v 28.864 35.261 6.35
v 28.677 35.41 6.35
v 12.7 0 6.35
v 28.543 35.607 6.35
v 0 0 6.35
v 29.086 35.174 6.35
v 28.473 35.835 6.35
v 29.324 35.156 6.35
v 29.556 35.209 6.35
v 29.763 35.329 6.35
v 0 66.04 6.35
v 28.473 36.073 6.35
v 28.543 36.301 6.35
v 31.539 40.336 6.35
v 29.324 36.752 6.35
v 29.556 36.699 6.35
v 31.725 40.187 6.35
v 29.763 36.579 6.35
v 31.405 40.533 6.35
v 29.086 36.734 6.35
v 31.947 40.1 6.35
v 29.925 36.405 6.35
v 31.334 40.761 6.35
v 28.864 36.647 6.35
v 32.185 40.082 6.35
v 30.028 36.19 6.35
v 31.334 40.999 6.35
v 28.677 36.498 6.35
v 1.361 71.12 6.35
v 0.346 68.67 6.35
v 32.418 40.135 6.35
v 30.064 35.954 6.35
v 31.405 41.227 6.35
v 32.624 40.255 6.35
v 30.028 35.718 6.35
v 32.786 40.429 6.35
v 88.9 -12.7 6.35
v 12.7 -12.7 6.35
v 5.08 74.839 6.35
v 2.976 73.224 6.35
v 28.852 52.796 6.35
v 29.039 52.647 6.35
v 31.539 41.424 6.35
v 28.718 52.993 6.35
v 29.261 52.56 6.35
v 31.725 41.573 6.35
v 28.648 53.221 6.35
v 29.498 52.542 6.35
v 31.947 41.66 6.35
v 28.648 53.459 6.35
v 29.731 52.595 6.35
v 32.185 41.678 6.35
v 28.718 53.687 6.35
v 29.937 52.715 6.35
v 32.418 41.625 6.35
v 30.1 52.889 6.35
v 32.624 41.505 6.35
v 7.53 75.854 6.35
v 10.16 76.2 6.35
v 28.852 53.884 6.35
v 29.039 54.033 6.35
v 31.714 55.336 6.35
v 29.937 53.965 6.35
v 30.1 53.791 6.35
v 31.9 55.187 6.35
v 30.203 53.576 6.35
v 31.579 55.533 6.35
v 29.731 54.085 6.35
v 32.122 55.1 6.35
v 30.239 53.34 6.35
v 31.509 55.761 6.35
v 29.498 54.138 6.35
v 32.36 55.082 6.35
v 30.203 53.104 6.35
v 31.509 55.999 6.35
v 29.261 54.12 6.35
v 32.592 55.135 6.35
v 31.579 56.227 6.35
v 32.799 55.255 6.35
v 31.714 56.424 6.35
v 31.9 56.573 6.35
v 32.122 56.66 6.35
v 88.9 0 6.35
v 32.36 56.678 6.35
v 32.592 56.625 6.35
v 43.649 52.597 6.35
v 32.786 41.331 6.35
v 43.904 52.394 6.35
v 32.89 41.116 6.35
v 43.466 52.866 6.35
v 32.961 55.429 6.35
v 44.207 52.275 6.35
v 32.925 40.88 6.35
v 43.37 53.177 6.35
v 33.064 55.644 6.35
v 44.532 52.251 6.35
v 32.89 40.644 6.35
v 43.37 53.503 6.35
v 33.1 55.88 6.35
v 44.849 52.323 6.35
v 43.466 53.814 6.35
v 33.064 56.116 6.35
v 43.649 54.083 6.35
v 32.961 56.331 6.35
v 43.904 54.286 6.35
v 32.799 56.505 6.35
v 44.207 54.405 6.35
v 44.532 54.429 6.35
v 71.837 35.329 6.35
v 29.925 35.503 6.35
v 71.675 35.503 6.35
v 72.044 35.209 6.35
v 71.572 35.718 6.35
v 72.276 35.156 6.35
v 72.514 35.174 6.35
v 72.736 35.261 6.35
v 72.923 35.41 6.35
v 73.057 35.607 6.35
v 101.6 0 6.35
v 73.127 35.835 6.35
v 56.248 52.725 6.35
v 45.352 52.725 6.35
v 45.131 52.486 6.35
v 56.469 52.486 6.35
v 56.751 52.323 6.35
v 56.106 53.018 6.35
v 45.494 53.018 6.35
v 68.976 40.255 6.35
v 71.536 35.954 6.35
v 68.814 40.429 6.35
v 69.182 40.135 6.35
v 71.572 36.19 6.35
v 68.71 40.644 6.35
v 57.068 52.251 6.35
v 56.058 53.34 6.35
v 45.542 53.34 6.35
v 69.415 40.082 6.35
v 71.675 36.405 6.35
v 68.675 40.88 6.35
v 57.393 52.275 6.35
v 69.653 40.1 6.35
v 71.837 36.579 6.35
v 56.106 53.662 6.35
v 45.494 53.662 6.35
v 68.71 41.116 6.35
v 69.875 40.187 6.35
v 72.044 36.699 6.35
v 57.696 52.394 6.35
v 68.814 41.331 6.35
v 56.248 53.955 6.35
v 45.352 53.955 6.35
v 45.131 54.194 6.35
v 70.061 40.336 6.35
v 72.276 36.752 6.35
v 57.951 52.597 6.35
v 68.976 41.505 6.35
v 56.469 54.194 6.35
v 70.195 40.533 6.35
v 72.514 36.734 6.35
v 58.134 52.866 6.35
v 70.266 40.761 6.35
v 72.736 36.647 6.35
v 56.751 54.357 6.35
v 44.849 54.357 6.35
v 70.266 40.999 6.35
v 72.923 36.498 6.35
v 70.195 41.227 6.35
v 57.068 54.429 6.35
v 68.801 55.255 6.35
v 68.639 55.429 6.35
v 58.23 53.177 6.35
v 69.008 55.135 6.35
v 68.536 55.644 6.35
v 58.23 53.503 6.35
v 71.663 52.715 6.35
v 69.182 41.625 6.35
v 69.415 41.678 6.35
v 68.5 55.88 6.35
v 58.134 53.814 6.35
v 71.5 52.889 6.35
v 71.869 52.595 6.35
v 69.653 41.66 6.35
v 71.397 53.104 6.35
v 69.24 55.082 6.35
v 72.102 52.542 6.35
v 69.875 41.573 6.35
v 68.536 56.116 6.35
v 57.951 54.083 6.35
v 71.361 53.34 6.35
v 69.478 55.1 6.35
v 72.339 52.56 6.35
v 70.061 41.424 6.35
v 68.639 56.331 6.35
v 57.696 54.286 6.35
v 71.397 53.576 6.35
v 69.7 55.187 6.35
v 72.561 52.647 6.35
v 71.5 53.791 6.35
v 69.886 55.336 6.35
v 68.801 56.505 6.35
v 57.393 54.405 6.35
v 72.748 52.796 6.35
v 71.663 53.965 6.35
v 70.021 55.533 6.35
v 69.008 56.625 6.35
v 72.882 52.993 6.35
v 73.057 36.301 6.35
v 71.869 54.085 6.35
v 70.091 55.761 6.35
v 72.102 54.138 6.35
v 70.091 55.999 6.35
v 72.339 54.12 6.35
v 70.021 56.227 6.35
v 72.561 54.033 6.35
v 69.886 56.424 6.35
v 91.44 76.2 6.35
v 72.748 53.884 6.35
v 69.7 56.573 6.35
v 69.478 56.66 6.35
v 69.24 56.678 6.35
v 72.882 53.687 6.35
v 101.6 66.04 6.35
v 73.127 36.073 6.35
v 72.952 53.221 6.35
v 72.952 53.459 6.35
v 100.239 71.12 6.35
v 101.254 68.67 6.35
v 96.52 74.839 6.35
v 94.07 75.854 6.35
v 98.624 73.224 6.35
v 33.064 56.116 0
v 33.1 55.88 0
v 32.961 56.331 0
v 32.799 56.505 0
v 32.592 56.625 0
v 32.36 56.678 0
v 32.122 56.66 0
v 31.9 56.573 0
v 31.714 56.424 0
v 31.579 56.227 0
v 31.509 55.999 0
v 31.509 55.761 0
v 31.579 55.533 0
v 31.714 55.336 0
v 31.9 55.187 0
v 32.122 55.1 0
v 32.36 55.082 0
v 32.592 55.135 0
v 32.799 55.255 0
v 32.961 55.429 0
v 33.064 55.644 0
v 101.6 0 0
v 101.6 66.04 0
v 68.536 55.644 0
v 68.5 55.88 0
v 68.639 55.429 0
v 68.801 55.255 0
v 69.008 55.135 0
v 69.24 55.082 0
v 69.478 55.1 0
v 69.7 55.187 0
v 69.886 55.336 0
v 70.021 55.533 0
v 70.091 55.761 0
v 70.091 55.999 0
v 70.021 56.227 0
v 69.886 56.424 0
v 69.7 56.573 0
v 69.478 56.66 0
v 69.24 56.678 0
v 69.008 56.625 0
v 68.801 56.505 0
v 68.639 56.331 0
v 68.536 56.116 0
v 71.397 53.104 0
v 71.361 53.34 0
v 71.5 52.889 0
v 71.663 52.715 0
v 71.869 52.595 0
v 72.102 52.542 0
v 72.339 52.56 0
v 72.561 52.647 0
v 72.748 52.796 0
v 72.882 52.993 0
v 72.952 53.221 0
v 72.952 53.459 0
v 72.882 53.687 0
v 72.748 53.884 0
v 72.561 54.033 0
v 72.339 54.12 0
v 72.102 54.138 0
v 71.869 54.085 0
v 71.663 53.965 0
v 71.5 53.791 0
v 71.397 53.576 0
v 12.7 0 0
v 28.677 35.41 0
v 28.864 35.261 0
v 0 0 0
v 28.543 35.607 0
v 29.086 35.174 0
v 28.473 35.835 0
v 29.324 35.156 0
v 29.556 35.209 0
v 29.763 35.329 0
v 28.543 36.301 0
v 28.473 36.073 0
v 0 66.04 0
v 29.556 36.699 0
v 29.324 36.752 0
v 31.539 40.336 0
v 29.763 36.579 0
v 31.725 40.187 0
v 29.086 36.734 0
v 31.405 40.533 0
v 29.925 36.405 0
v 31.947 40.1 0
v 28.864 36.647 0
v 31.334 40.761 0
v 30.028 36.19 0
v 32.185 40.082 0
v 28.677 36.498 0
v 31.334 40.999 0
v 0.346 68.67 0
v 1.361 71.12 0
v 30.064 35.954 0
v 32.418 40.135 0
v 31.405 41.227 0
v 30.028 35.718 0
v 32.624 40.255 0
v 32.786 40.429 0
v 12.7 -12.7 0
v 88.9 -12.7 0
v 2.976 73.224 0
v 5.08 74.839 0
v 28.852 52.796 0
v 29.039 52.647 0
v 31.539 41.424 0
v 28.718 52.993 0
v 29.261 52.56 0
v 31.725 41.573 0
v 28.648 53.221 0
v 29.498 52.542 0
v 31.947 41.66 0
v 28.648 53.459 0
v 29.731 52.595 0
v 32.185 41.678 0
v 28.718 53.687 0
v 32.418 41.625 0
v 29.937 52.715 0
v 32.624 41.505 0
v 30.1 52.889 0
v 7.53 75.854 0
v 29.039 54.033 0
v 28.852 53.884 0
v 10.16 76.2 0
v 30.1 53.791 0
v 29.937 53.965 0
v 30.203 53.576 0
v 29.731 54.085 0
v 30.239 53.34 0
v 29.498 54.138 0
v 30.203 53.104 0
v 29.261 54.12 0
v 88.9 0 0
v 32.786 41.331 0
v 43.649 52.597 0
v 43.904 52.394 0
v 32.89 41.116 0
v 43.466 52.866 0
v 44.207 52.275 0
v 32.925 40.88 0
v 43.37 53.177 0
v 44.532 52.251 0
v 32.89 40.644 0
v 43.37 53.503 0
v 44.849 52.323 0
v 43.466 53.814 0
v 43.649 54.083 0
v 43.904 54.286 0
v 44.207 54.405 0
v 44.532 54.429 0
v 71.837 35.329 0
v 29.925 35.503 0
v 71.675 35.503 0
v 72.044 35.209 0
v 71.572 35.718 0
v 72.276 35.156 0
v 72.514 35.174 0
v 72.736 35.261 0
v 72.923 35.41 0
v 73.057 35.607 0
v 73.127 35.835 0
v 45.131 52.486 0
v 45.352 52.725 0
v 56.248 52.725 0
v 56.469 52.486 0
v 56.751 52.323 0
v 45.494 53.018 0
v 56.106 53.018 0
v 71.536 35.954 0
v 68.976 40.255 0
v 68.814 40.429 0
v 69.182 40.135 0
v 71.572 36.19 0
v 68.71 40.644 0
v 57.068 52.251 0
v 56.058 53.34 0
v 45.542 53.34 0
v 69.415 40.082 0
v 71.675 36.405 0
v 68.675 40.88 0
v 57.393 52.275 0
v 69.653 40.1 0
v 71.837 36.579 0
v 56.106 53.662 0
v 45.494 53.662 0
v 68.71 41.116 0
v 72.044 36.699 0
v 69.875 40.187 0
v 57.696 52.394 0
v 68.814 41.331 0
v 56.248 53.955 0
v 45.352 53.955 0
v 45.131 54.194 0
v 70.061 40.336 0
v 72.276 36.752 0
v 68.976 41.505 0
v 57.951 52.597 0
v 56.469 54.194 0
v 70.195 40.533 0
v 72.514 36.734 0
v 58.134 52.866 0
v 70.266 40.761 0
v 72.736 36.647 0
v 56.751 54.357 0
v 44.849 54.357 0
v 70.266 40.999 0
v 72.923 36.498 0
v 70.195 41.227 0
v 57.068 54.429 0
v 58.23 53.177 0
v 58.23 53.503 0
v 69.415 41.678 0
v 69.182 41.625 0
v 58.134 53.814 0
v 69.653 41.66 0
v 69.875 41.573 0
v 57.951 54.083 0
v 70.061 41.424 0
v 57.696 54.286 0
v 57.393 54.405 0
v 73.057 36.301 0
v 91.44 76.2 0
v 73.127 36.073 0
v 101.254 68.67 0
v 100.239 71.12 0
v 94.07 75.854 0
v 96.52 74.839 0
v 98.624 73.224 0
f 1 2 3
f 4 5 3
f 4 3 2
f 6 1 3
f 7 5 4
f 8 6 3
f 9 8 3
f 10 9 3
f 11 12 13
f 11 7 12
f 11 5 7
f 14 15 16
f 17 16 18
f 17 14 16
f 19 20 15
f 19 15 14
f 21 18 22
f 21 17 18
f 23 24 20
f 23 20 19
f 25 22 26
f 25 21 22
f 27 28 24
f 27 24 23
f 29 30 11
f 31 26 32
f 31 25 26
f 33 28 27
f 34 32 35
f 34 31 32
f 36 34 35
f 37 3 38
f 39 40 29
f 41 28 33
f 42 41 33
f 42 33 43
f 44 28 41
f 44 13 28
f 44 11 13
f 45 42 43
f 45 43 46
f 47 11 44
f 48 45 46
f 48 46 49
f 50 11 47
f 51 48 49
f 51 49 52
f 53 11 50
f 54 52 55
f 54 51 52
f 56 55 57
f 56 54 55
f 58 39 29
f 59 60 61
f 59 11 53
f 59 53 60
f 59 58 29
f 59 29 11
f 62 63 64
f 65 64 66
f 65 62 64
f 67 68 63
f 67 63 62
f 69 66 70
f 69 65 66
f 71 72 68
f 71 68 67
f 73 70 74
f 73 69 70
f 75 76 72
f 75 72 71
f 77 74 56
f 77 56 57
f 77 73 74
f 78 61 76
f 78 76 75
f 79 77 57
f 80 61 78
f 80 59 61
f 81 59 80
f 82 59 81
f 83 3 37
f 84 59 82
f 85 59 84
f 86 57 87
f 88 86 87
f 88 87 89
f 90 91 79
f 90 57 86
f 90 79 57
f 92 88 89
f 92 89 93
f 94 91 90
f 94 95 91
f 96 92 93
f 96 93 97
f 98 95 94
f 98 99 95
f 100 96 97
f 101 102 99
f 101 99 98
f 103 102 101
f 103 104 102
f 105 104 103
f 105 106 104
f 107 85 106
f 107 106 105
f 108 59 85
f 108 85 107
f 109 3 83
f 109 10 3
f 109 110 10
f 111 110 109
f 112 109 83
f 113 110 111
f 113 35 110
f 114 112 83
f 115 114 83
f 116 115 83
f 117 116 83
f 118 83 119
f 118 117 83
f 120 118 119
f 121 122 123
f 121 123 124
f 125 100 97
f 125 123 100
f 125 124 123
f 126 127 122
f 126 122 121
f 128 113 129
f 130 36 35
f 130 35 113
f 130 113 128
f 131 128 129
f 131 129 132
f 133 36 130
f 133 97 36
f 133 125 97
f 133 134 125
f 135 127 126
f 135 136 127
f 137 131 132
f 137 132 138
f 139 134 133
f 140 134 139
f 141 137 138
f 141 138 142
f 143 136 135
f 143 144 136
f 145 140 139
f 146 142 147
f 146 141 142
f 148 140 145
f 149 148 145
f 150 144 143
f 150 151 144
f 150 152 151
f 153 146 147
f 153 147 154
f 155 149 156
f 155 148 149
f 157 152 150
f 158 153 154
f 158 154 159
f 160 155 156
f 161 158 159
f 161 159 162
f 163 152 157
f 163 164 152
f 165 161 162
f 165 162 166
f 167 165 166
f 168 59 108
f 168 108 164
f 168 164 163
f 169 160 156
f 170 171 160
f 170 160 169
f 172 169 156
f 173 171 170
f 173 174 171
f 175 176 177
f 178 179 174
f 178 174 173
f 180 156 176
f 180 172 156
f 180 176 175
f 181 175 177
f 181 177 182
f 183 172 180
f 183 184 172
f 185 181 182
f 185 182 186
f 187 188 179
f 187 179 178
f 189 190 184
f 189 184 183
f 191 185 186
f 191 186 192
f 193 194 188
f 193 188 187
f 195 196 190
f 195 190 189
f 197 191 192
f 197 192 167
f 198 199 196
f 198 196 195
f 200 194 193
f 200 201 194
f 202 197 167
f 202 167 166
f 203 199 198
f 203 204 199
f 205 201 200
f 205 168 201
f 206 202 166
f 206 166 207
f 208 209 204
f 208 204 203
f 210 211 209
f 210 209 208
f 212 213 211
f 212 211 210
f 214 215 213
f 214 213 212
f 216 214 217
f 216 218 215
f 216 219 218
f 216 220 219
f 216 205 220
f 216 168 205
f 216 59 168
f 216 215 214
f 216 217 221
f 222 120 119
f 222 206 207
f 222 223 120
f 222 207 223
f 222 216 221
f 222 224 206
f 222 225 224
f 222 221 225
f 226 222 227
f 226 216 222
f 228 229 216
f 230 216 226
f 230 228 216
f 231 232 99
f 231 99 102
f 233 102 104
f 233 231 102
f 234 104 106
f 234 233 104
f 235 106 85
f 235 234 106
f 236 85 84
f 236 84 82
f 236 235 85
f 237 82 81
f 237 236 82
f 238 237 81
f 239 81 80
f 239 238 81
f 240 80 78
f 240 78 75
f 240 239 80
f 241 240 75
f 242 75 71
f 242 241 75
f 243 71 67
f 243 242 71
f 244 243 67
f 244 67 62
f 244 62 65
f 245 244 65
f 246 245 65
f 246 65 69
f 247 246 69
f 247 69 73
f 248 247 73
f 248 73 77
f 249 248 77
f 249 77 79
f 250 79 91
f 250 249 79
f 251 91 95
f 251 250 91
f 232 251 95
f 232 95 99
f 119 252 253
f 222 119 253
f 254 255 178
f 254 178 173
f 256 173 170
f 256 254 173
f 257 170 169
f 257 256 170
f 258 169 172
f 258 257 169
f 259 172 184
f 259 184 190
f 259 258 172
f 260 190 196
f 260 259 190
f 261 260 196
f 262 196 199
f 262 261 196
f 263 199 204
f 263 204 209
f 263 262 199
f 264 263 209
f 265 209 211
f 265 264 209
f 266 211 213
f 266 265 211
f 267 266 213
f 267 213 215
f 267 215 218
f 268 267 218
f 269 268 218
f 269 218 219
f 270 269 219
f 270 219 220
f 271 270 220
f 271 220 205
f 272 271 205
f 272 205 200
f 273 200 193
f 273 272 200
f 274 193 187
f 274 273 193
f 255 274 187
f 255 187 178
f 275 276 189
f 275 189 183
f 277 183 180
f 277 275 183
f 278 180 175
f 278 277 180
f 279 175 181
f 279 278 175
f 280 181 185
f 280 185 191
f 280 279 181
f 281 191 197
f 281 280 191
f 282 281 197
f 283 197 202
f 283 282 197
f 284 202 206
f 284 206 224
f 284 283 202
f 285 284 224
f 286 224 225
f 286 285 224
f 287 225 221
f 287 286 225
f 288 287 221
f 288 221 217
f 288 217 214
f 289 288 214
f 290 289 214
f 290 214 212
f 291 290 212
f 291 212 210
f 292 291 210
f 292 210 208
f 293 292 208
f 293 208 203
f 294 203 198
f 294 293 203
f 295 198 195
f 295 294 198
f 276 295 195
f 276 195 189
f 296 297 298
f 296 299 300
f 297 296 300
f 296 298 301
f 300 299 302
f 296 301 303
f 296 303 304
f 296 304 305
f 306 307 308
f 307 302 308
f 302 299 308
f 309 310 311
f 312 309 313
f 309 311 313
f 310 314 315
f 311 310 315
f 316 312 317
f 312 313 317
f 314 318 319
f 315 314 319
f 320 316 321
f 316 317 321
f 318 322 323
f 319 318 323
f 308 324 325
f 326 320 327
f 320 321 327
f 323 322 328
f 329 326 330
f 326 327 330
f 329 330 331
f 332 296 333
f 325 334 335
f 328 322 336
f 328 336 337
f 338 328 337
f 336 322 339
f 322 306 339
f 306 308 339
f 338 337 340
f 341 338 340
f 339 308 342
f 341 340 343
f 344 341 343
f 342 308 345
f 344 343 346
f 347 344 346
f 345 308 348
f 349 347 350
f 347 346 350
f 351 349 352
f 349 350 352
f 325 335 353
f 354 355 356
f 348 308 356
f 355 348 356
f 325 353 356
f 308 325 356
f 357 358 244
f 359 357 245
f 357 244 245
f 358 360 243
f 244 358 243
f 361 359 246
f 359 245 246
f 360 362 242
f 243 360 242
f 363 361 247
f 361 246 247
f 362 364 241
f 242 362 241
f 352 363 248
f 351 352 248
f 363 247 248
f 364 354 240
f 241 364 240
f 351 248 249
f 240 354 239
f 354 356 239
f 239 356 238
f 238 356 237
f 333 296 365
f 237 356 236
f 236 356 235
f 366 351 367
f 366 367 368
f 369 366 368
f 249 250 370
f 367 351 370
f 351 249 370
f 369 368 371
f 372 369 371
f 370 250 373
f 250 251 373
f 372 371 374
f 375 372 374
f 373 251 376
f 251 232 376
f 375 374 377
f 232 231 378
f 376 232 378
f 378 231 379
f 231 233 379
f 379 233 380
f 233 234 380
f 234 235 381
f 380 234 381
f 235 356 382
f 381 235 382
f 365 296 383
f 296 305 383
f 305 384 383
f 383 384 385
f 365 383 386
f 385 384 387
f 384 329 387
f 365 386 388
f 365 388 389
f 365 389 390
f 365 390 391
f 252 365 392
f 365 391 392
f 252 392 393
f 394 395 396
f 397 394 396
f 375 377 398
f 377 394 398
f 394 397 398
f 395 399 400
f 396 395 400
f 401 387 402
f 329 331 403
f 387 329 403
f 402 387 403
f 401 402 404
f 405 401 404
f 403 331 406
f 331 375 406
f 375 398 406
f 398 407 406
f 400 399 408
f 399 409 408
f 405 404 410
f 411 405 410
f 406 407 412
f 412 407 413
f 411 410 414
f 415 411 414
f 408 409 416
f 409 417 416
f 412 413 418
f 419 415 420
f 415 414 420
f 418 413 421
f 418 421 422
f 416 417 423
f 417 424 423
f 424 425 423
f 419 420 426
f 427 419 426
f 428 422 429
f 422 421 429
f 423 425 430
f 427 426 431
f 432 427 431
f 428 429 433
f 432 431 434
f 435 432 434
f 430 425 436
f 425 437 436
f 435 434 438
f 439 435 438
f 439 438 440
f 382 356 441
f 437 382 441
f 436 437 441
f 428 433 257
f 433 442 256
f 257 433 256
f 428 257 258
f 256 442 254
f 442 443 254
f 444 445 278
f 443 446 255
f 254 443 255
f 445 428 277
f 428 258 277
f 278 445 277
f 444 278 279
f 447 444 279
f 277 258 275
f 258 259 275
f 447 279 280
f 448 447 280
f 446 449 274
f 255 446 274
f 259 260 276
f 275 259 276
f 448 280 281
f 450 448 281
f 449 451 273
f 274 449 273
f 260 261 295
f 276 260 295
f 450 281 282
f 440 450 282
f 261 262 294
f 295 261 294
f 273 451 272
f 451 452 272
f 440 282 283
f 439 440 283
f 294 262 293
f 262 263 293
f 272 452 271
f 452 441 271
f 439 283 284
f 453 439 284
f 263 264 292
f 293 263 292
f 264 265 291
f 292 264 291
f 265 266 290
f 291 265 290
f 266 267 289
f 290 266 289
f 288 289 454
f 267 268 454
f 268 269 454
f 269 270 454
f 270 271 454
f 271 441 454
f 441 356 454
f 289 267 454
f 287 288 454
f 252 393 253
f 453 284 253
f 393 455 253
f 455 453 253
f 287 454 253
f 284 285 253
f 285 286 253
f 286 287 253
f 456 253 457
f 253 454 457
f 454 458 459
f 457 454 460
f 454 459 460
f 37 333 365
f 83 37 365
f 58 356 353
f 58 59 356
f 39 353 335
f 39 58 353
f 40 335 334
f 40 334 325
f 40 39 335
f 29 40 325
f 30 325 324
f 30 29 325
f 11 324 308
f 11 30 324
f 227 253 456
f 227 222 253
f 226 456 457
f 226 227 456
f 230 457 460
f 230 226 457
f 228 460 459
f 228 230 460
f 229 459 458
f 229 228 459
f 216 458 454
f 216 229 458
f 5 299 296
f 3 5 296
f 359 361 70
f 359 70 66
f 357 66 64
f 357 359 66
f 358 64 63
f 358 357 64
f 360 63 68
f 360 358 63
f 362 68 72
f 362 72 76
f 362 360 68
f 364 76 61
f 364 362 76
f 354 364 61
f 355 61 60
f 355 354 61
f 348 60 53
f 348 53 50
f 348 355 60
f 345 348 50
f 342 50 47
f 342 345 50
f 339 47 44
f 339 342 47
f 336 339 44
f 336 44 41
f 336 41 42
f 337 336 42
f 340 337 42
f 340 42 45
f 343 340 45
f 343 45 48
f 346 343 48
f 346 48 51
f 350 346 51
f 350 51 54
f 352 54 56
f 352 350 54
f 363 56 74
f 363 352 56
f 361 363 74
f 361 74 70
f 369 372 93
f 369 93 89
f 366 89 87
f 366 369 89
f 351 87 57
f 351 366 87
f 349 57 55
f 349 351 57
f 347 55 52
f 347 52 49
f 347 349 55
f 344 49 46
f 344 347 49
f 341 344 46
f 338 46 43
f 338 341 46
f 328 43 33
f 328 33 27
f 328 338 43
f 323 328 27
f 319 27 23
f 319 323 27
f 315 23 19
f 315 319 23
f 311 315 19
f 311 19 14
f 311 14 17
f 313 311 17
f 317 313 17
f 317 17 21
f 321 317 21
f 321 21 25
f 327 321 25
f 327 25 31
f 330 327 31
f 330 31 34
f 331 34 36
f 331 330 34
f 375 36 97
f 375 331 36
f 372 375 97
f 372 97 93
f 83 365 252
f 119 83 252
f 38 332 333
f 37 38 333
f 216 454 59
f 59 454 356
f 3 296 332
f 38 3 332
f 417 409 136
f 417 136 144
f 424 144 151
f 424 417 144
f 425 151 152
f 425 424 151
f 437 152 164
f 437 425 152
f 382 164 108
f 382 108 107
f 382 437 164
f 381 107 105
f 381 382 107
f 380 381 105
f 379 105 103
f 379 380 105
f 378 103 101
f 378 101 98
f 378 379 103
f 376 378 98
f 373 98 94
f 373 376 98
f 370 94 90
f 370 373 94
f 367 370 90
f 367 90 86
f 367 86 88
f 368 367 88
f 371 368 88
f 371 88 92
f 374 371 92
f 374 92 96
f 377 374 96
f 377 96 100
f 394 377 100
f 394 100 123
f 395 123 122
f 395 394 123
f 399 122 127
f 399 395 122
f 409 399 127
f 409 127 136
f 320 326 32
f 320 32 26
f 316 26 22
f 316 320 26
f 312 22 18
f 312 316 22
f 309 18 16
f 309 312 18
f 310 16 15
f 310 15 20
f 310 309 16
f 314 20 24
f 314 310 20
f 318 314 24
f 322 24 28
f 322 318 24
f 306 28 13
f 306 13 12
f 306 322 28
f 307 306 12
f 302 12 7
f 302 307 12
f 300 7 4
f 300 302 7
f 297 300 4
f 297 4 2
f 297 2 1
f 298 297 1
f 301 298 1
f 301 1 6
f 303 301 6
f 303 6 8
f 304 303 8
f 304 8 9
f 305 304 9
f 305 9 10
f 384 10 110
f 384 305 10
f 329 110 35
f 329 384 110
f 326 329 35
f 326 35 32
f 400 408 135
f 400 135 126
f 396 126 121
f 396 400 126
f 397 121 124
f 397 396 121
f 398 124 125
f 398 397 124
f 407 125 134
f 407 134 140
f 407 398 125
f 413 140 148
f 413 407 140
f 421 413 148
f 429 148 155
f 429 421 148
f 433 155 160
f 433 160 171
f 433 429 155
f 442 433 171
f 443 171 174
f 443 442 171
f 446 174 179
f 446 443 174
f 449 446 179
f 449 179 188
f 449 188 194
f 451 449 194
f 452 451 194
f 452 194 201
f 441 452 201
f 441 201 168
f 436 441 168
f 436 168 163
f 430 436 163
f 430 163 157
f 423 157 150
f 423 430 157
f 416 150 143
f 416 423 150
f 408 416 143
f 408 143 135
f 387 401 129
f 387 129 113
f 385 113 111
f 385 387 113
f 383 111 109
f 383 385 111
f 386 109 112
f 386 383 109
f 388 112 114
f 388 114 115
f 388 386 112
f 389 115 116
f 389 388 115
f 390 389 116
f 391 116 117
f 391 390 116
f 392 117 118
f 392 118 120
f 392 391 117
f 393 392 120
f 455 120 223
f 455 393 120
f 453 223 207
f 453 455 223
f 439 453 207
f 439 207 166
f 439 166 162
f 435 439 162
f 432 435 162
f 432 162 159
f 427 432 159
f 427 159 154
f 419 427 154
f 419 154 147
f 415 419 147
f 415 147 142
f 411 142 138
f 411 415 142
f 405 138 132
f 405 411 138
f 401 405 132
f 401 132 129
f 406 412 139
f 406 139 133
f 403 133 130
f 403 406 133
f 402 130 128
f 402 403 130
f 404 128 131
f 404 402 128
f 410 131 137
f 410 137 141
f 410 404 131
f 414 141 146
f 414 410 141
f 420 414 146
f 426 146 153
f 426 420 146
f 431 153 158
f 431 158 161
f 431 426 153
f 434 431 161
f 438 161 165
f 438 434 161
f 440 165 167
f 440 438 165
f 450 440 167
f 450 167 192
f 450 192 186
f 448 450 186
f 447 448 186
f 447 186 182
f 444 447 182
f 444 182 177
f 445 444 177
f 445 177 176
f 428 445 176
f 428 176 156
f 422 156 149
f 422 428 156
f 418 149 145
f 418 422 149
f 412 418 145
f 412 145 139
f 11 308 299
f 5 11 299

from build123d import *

# Parameters (mm, degrees)
SKETCH1_R           = 1.0922
SKETCH1_R_2         = 0.8
BOSS_EXTRUDE1_DEPTH = 6.35
FILLET1_R           = 10.16


with BuildPart() as part:
    # Sketch1 → Boss-Extrude1 (new body)
    with BuildSketch(Plane.XY):
        Polygon((88.9, 0), (101.6, 0), (101.6, 76.2), (0, 76.2), (0, 0), (12.7, 0), (12.7, -12.7), (88.9, -12.7), align=None)
        with Locations((44.45, 53.34)):
            Circle(SKETCH1_R, mode=Mode.SUBTRACT)
        with Locations(Location((57.15, 53.34, 0), (0, 0, 180))):
            Circle(SKETCH1_R, mode=Mode.SUBTRACT)
        with Locations((32.3, 55.88)):
            Circle(SKETCH1_R_2, mode=Mode.SUBTRACT)
        with Locations(Location((69.3, 55.88, 0), (0, 0, 180))):
            Circle(SKETCH1_R_2, mode=Mode.SUBTRACT)
        with Locations((32.125311619, 40.88)):
            Circle(SKETCH1_R_2, mode=Mode.SUBTRACT)
        with Locations(Location((69.474688381, 40.88, 0), (0, 0, 180))):
            Circle(SKETCH1_R_2, mode=Mode.SUBTRACT)
        with Locations((29.4386, 53.34)):
            Circle(SKETCH1_R_2, mode=Mode.SUBTRACT)
        with Locations((29.263911619, 35.9540048)):
            Circle(SKETCH1_R_2, mode=Mode.SUBTRACT)
        with Locations(Location((72.336088381, 35.9540048, 0), (0, 0, 180))):
            Circle(SKETCH1_R_2, mode=Mode.SUBTRACT)
        with Locations(Location((72.1614, 53.34, 0), (0, 0, 180))):
            Circle(SKETCH1_R_2, mode=Mode.SUBTRACT)
    extrude(amount=BOSS_EXTRUDE1_DEPTH)

    # Fillet1
    fillet1_edges = [part.edges().sort_by_distance(p)[0] for p in [
        (0, 76.2, 3.175),
        (101.6, 76.2, 3.175),
    ]]
    fillet(fillet1_edges, radius=FILLET1_R)


solid = part.part
